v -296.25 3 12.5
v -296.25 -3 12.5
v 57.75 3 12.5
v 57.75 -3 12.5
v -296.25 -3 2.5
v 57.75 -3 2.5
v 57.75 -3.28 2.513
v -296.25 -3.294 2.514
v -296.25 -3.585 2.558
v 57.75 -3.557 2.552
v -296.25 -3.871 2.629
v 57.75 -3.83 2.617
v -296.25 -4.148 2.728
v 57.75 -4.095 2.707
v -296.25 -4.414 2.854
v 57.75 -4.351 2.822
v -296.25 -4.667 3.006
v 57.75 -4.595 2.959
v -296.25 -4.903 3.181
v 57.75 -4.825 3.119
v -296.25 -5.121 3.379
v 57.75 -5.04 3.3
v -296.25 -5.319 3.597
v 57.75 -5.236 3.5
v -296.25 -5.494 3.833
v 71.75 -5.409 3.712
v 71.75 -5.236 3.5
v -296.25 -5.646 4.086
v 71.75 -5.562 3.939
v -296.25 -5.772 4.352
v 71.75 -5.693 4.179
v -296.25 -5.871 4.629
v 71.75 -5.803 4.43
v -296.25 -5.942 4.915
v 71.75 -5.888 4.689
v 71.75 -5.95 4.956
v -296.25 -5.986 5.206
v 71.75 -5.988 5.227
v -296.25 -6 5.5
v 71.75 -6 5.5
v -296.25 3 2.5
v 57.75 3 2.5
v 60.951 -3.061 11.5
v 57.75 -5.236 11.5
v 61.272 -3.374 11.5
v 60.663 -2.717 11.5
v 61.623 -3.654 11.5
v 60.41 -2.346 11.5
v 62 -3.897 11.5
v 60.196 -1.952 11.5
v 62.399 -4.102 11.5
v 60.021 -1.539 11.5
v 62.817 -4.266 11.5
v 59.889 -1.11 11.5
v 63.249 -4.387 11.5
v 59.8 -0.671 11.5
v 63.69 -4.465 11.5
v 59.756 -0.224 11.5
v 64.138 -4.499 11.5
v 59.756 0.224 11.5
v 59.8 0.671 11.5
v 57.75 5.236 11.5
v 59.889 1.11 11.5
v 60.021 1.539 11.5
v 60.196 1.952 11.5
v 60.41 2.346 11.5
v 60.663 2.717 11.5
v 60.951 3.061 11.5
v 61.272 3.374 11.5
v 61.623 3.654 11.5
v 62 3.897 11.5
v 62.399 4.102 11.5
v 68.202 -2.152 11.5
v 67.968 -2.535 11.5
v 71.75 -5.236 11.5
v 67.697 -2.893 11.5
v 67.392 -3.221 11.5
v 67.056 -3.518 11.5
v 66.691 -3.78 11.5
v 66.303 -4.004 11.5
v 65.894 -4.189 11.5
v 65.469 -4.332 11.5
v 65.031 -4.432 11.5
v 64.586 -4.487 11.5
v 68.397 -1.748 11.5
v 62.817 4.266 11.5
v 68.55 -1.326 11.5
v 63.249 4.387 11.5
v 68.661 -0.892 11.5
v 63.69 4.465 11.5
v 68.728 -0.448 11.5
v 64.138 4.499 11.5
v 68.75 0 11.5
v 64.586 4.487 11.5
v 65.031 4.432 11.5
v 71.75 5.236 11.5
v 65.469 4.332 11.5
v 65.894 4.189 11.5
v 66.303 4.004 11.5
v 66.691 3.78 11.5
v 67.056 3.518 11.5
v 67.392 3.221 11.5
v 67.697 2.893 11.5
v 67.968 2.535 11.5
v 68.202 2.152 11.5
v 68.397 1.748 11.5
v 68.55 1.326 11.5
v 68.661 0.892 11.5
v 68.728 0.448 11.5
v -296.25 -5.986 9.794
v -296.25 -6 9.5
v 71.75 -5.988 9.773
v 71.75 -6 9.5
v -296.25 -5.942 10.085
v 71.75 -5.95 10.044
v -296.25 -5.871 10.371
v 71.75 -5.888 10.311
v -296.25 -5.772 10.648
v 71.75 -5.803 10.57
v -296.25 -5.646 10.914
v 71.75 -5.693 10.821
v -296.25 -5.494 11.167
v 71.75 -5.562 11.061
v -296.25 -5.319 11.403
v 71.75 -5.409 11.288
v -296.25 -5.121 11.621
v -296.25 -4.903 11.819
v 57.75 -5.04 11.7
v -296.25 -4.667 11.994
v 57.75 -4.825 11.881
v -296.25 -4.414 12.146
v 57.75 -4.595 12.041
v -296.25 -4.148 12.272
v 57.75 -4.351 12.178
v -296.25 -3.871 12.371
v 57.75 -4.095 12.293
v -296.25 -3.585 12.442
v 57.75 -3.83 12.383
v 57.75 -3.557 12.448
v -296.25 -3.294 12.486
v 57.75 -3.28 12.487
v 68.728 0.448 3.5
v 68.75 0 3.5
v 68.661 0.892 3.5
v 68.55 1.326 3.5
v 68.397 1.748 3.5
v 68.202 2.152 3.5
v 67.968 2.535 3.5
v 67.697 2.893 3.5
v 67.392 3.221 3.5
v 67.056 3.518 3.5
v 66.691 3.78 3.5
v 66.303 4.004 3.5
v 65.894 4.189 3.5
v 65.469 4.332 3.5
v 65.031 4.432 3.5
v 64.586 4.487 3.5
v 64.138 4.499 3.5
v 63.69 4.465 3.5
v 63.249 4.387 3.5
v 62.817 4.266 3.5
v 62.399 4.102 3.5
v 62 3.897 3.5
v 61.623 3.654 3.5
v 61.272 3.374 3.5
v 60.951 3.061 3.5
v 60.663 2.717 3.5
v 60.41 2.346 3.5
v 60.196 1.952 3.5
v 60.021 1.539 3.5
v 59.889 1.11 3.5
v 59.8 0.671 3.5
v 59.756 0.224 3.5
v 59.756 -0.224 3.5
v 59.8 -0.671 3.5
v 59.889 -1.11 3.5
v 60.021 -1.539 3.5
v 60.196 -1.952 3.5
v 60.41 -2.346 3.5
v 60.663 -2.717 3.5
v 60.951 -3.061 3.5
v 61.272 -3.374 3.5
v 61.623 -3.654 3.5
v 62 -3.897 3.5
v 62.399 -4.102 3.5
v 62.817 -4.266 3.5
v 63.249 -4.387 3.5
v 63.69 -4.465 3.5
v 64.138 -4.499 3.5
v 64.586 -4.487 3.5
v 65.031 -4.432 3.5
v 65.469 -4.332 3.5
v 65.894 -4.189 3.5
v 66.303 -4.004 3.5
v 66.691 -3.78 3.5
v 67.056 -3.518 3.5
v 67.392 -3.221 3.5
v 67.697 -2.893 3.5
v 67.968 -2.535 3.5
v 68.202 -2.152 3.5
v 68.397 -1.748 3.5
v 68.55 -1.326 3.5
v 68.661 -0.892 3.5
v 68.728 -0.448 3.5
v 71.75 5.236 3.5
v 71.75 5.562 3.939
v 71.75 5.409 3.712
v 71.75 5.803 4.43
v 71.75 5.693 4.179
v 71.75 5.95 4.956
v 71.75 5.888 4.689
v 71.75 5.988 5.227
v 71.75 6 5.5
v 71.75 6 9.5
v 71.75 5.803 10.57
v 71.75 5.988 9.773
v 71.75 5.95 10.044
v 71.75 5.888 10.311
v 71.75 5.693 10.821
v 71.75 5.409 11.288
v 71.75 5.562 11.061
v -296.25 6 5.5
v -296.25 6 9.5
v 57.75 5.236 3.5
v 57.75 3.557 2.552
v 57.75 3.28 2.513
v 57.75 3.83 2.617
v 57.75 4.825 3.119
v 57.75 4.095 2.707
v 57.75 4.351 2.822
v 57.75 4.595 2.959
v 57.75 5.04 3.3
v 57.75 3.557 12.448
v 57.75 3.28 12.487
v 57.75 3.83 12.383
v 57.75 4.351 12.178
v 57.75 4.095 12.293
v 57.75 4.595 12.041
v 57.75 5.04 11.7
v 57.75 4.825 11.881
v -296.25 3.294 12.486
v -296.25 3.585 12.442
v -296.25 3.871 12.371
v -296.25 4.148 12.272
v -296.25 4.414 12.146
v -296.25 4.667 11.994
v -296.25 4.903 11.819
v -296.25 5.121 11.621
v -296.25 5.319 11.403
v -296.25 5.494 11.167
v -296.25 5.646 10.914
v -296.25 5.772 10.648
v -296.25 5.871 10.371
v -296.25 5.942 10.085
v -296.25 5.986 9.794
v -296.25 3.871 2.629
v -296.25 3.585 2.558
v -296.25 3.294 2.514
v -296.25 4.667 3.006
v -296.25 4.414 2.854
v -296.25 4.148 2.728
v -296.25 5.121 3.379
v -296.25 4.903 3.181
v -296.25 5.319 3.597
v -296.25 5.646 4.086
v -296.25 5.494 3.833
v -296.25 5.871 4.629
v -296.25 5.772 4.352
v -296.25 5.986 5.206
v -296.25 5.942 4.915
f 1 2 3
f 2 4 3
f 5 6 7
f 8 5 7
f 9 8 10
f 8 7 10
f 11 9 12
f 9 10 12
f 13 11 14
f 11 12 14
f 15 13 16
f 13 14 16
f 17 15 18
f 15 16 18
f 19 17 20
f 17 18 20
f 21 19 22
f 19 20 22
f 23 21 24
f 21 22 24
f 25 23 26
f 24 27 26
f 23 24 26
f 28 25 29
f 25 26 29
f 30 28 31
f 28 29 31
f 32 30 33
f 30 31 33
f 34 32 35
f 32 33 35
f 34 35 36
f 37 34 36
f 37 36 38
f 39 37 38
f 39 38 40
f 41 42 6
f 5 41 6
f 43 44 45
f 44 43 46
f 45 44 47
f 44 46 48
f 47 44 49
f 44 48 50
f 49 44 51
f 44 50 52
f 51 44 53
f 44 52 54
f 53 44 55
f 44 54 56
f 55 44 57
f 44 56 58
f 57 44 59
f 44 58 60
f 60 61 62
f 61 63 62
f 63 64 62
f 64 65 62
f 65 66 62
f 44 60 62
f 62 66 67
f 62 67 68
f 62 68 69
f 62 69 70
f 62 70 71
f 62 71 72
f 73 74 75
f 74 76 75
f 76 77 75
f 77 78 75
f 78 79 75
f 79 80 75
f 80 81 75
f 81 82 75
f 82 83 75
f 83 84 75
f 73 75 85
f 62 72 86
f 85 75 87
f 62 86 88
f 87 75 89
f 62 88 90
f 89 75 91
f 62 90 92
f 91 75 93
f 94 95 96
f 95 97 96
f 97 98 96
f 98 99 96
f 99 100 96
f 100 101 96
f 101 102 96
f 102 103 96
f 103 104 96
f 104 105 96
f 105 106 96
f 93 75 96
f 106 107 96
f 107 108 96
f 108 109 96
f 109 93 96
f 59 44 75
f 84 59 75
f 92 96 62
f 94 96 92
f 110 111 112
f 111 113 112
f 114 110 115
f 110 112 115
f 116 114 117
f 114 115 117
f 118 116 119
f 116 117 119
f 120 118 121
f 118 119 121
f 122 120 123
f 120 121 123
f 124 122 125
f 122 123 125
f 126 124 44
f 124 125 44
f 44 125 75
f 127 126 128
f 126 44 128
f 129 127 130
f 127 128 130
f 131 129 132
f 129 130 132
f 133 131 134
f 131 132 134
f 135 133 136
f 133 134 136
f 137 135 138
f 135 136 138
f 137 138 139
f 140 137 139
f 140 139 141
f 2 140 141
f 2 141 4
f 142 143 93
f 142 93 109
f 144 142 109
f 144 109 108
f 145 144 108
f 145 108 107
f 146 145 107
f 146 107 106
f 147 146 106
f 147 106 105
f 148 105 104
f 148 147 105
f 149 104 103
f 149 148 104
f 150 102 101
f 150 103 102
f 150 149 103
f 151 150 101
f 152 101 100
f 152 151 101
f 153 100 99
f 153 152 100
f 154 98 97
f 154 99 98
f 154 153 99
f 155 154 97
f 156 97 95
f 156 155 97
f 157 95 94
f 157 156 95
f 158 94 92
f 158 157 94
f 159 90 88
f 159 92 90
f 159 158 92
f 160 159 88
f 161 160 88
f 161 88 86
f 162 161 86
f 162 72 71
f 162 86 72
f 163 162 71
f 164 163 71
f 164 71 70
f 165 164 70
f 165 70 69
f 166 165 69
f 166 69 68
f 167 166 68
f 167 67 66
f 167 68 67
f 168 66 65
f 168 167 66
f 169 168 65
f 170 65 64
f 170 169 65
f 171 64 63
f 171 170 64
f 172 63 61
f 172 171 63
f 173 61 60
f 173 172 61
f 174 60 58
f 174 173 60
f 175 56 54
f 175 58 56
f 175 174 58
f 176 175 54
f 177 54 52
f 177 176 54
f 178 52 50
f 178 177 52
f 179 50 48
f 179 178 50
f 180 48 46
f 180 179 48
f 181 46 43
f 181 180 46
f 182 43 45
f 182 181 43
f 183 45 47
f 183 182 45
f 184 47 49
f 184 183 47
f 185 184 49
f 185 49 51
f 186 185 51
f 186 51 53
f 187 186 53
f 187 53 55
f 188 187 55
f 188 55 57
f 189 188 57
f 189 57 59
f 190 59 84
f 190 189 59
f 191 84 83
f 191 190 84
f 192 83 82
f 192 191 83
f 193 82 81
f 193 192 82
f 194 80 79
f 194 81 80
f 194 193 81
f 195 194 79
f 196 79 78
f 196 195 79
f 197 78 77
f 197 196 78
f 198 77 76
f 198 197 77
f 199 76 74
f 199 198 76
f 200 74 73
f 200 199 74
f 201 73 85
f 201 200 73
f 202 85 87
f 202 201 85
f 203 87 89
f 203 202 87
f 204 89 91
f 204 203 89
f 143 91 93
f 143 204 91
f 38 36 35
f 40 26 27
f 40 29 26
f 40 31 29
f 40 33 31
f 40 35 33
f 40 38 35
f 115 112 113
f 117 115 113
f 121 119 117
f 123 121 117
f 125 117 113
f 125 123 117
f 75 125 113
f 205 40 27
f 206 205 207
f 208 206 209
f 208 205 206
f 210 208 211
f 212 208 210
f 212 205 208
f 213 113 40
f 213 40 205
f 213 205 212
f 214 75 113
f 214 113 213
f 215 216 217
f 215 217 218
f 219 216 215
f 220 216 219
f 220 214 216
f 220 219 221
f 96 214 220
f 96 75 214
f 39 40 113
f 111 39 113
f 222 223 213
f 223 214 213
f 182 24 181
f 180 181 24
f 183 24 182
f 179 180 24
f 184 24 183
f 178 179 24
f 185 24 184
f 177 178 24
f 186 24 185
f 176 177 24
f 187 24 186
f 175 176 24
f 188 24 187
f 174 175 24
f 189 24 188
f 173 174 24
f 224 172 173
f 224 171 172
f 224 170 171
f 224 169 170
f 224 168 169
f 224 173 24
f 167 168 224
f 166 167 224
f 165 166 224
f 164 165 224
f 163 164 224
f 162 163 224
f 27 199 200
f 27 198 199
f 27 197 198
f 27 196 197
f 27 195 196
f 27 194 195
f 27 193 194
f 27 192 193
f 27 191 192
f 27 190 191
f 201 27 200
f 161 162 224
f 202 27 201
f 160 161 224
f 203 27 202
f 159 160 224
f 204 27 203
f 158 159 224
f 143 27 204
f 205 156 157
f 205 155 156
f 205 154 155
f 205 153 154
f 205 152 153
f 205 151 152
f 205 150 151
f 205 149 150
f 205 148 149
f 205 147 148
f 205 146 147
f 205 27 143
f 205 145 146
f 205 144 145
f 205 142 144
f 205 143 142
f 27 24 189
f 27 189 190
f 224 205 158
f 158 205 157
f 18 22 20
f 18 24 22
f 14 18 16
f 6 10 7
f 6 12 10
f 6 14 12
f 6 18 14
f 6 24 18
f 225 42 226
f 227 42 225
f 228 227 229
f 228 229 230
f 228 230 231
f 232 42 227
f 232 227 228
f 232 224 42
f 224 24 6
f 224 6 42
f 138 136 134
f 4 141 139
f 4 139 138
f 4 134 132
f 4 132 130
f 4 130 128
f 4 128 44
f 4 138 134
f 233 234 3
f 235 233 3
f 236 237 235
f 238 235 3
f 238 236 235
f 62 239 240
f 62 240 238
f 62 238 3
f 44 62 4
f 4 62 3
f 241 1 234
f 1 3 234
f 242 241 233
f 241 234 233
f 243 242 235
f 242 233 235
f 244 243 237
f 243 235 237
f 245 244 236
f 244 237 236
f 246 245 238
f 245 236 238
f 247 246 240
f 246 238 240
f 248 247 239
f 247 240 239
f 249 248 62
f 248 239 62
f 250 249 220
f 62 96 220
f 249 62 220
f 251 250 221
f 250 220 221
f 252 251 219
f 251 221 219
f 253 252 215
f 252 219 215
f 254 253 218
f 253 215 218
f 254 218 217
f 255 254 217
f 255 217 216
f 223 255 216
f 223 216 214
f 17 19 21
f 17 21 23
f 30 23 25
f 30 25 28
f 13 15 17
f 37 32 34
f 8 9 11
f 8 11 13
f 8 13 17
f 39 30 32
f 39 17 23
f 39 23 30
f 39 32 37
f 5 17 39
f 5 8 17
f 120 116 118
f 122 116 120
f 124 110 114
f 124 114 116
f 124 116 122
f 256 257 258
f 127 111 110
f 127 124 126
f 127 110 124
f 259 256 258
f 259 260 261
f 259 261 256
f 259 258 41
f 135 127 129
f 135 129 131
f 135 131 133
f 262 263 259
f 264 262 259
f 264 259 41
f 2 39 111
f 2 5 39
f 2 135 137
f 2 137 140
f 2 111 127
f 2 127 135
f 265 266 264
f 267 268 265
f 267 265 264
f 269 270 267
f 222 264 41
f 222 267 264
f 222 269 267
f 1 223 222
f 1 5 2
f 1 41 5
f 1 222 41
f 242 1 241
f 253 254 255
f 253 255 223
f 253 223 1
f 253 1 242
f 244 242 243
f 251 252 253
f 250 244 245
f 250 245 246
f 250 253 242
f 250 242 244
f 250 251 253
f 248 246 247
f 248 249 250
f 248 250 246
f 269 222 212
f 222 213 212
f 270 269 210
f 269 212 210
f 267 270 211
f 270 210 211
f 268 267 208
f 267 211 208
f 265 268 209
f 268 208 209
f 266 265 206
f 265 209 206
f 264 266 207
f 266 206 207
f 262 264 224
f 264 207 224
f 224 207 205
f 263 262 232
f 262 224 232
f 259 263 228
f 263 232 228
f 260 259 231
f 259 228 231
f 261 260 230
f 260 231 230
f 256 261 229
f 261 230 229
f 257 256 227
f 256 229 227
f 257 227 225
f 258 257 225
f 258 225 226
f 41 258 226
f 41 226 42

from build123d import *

# Parameters (mm, degrees)
CROQUIS1_W                 = 37.5
CROQUIS1_H                 = 30
SALIENTE_EXTRUIR1_DEPTH    = 15
CROQUIS2_R                 = 2.1
SALIENTE_EXTRUIR2_DEPTH    = 1
SALIENTE_EXTRUIR3_DEPTH    = 35
CROQUIS5_W                 = 18
CROQUIS5_H                 = 12
CROQUIS5_R                 = 4.5
SALIENTE_EXTRUIR4_DEPTH    = 5
CROQUIS6_W                 = 1
CROQUIS6_H                 = 12
CORTAR_EXTRUIR2_DEPTH      = 14
REDONDEO2_R                = 3
CORTAR_EXTRUIR3_DEPTH      = 78.447159406
CORTAR_EXTRUIR3_DEPTH_BACK = 78.447159406
CROQUIS7_OUTSIDE_W         = 123.972
CROQUIS7_OUTSIDE_H         = 74.472
CROQUIS7_OUTSIDE_W_2       = 24.163279834
CROQUIS7_OUTSIDE_H_2       = 36.211204922
SALIENTE_EXTRUIR5_DEPTH    = 350


with BuildPart() as part:
    # Croquis1 → Saliente-Extruir1 (new body)
    with BuildSketch(Plane.XY):
        Rectangle(CROQUIS1_W, CROQUIS1_H)
    extrude(amount=SALIENTE_EXTRUIR1_DEPTH)

    # Croquis2 → Saliente-Extruir2 (add)
    # profile 1 of 3: a face of its own
    with BuildSketch(Plane.XY):
        with BuildLine():
            Line((-18.75, 3.7), (-26.75, 3.7))
            ThreePointArc((-26.75, 3.7), (-27.457106781, 3.407106781), (-27.75, 2.7))
            Line((-27.75, 2.7), (-27.75, -2.7))
            ThreePointArc((-27.75, -2.7), (-27.457106781, -3.407106781), (-26.75, -3.7))
            Line((-26.75, -3.7), (-18.75, -3.7))
            Line((-18.75, -3.7), (-18.75, 3.7))
        make_face()
        with Locations((-23.25, 0)):
            Circle(CROQUIS2_R, mode=Mode.SUBTRACT)
    # profile 2 of 3: a face of its own
    with BuildSketch(Plane.XY):
        with BuildLine():
            Line((-10, 15), (10, 15))
            Line((10, 15), (10, 24))
            ThreePointArc((10, 24), (9.707106781, 24.707106781), (9, 25))
            Line((9, 25), (-9, 25))
            ThreePointArc((-9, 25), (-9.707106781, 24.707106781), (-10, 24))
            Line((-10, 24), (-10, 15))
        make_face()
        with Locations((-5.5, 20)):
            Circle(CROQUIS2_R, mode=Mode.SUBTRACT)
        with Locations((5.5, 20)):
            Circle(CROQUIS2_R, mode=Mode.SUBTRACT)
    # profile 3 of 3: a face of its own
    with BuildSketch(Plane.XY):
        with BuildLine():
            Line((-9, -25), (9, -25))
            ThreePointArc((9, -25), (9.707106781, -24.707106781), (10, -24))
            Line((10, -24), (10, -15))
            Line((10, -15), (-10, -15))
            Line((-10, -15), (-10, -24))
            ThreePointArc((-10, -24), (-9.707106781, -24.707106781), (-9, -25))
        make_face()
        with Locations(Location((5.5, -20, 0), (0, 0, 180))):
            Circle(CROQUIS2_R, mode=Mode.SUBTRACT)
        with Locations(Location((-5.5, -20, 0), (0, 0, 180))):
            Circle(CROQUIS2_R, mode=Mode.SUBTRACT)
    extrude(amount=SALIENTE_EXTRUIR2_DEPTH)

    # Croquis3 → Saliente-Extruir3 (add)
    with BuildSketch(Plane(origin=(18.75, 0, 0), x_dir=(0, 0, -1), z_dir=(1, 0, 0))):
        with BuildLine():
            Line((-10.5, -12.5), (-4.5, -12.5))
            ThreePointArc((-4.5, -12.5), (-2.378679656, -11.621320344), (-1.5, -9.5))
            Line((-1.5, -9.5), (-1.5, 9.5))
            ThreePointArc((-1.5, 9.5), (-2.378679656, 11.621320344), (-4.5, 12.5))
            Line((-4.5, 12.5), (-10.5, 12.5))
            ThreePointArc((-10.5, 12.5), (-12.621320344, 11.621320344), (-13.5, 9.5))
            Line((-13.5, 9.5), (-13.5, -9.5))
            ThreePointArc((-13.5, -9.5), (-12.621320344, -11.621320344), (-10.5, -12.5))
        make_face()
    extrude(amount=SALIENTE_EXTRUIR3_DEPTH)

    # Croquis5 → Saliente-Extruir4 (add, symmetric)
    with BuildSketch(Plane.XY.offset(7.5)):
        with Locations((62.75, 0)):
            Rectangle(CROQUIS5_W, CROQUIS5_H)
        with Locations((64.25, 0)):
            Circle(CROQUIS5_R, mode=Mode.SUBTRACT)
    extrude(amount=SALIENTE_EXTRUIR4_DEPTH, both=True)

    # Croquis6 → Cortar-Extruir2 (cut)
    with BuildSketch(Plane(origin=(71.75, 0, 0), x_dir=(0, 0, -1), z_dir=(1, 0, 0))):
        with Locations((-12, 0)):
            Rectangle(CROQUIS6_W, CROQUIS6_H)
        with Locations((-3, 0)):
            Rectangle(CROQUIS6_W, CROQUIS6_H)
    extrude(amount=-CORTAR_EXTRUIR2_DEPTH, mode=Mode.SUBTRACT)

    # Redondeo2
    redondeo2_edges = [part.edges().sort_by_distance(p)[0] for p in [
        (55.75, -6, 12.5),
        (55.75, -6, 2.5),
        (55.75, 6, 2.5),
        (55.75, 6, 12.5),
    ]]
    fillet(redondeo2_edges, radius=REDONDEO2_R)

    # Croquis7 outside → Cortar-Extruir3 (cut, two sides: drawn at the far end of the back side and taken through both)
    with BuildSketch(Plane.XY.offset(15).offset(-CORTAR_EXTRUIR3_DEPTH_BACK)):
        with Locations((22, 0)):
            Rectangle(CROQUIS7_OUTSIDE_W, CROQUIS7_OUTSIDE_H)
        with Locations((65.831639917, -3.105602461)):
            Rectangle(CROQUIS7_OUTSIDE_W_2, CROQUIS7_OUTSIDE_H_2, mode=Mode.SUBTRACT)
    extrude(amount=CORTAR_EXTRUIR3_DEPTH + CORTAR_EXTRUIR3_DEPTH_BACK, mode=Mode.SUBTRACT)

    # Croquis10 → Saliente-Extruir5 (add)
    with BuildSketch(Plane.ZY.offset(-53.75)):
        with BuildLine():
            Line((5.5, -6), (9.5, -6))
            ThreePointArc((9.5, -6), (11.621320344, -5.121320344), (12.5, -3))
            Line((12.5, -3), (12.5, 3))
            ThreePointArc((12.5, 3), (11.621320344, 5.121320344), (9.5, 6))
            Line((9.5, 6), (5.5, 6))
            ThreePointArc((5.5, 6), (3.378679656, 5.121320344), (2.5, 3))
            Line((2.5, 3), (2.5, -3))
            ThreePointArc((2.5, -3), (3.378679656, -5.121320344), (5.5, -6))
        make_face()
    extrude(amount=SALIENTE_EXTRUIR5_DEPTH)


solid = part.part
